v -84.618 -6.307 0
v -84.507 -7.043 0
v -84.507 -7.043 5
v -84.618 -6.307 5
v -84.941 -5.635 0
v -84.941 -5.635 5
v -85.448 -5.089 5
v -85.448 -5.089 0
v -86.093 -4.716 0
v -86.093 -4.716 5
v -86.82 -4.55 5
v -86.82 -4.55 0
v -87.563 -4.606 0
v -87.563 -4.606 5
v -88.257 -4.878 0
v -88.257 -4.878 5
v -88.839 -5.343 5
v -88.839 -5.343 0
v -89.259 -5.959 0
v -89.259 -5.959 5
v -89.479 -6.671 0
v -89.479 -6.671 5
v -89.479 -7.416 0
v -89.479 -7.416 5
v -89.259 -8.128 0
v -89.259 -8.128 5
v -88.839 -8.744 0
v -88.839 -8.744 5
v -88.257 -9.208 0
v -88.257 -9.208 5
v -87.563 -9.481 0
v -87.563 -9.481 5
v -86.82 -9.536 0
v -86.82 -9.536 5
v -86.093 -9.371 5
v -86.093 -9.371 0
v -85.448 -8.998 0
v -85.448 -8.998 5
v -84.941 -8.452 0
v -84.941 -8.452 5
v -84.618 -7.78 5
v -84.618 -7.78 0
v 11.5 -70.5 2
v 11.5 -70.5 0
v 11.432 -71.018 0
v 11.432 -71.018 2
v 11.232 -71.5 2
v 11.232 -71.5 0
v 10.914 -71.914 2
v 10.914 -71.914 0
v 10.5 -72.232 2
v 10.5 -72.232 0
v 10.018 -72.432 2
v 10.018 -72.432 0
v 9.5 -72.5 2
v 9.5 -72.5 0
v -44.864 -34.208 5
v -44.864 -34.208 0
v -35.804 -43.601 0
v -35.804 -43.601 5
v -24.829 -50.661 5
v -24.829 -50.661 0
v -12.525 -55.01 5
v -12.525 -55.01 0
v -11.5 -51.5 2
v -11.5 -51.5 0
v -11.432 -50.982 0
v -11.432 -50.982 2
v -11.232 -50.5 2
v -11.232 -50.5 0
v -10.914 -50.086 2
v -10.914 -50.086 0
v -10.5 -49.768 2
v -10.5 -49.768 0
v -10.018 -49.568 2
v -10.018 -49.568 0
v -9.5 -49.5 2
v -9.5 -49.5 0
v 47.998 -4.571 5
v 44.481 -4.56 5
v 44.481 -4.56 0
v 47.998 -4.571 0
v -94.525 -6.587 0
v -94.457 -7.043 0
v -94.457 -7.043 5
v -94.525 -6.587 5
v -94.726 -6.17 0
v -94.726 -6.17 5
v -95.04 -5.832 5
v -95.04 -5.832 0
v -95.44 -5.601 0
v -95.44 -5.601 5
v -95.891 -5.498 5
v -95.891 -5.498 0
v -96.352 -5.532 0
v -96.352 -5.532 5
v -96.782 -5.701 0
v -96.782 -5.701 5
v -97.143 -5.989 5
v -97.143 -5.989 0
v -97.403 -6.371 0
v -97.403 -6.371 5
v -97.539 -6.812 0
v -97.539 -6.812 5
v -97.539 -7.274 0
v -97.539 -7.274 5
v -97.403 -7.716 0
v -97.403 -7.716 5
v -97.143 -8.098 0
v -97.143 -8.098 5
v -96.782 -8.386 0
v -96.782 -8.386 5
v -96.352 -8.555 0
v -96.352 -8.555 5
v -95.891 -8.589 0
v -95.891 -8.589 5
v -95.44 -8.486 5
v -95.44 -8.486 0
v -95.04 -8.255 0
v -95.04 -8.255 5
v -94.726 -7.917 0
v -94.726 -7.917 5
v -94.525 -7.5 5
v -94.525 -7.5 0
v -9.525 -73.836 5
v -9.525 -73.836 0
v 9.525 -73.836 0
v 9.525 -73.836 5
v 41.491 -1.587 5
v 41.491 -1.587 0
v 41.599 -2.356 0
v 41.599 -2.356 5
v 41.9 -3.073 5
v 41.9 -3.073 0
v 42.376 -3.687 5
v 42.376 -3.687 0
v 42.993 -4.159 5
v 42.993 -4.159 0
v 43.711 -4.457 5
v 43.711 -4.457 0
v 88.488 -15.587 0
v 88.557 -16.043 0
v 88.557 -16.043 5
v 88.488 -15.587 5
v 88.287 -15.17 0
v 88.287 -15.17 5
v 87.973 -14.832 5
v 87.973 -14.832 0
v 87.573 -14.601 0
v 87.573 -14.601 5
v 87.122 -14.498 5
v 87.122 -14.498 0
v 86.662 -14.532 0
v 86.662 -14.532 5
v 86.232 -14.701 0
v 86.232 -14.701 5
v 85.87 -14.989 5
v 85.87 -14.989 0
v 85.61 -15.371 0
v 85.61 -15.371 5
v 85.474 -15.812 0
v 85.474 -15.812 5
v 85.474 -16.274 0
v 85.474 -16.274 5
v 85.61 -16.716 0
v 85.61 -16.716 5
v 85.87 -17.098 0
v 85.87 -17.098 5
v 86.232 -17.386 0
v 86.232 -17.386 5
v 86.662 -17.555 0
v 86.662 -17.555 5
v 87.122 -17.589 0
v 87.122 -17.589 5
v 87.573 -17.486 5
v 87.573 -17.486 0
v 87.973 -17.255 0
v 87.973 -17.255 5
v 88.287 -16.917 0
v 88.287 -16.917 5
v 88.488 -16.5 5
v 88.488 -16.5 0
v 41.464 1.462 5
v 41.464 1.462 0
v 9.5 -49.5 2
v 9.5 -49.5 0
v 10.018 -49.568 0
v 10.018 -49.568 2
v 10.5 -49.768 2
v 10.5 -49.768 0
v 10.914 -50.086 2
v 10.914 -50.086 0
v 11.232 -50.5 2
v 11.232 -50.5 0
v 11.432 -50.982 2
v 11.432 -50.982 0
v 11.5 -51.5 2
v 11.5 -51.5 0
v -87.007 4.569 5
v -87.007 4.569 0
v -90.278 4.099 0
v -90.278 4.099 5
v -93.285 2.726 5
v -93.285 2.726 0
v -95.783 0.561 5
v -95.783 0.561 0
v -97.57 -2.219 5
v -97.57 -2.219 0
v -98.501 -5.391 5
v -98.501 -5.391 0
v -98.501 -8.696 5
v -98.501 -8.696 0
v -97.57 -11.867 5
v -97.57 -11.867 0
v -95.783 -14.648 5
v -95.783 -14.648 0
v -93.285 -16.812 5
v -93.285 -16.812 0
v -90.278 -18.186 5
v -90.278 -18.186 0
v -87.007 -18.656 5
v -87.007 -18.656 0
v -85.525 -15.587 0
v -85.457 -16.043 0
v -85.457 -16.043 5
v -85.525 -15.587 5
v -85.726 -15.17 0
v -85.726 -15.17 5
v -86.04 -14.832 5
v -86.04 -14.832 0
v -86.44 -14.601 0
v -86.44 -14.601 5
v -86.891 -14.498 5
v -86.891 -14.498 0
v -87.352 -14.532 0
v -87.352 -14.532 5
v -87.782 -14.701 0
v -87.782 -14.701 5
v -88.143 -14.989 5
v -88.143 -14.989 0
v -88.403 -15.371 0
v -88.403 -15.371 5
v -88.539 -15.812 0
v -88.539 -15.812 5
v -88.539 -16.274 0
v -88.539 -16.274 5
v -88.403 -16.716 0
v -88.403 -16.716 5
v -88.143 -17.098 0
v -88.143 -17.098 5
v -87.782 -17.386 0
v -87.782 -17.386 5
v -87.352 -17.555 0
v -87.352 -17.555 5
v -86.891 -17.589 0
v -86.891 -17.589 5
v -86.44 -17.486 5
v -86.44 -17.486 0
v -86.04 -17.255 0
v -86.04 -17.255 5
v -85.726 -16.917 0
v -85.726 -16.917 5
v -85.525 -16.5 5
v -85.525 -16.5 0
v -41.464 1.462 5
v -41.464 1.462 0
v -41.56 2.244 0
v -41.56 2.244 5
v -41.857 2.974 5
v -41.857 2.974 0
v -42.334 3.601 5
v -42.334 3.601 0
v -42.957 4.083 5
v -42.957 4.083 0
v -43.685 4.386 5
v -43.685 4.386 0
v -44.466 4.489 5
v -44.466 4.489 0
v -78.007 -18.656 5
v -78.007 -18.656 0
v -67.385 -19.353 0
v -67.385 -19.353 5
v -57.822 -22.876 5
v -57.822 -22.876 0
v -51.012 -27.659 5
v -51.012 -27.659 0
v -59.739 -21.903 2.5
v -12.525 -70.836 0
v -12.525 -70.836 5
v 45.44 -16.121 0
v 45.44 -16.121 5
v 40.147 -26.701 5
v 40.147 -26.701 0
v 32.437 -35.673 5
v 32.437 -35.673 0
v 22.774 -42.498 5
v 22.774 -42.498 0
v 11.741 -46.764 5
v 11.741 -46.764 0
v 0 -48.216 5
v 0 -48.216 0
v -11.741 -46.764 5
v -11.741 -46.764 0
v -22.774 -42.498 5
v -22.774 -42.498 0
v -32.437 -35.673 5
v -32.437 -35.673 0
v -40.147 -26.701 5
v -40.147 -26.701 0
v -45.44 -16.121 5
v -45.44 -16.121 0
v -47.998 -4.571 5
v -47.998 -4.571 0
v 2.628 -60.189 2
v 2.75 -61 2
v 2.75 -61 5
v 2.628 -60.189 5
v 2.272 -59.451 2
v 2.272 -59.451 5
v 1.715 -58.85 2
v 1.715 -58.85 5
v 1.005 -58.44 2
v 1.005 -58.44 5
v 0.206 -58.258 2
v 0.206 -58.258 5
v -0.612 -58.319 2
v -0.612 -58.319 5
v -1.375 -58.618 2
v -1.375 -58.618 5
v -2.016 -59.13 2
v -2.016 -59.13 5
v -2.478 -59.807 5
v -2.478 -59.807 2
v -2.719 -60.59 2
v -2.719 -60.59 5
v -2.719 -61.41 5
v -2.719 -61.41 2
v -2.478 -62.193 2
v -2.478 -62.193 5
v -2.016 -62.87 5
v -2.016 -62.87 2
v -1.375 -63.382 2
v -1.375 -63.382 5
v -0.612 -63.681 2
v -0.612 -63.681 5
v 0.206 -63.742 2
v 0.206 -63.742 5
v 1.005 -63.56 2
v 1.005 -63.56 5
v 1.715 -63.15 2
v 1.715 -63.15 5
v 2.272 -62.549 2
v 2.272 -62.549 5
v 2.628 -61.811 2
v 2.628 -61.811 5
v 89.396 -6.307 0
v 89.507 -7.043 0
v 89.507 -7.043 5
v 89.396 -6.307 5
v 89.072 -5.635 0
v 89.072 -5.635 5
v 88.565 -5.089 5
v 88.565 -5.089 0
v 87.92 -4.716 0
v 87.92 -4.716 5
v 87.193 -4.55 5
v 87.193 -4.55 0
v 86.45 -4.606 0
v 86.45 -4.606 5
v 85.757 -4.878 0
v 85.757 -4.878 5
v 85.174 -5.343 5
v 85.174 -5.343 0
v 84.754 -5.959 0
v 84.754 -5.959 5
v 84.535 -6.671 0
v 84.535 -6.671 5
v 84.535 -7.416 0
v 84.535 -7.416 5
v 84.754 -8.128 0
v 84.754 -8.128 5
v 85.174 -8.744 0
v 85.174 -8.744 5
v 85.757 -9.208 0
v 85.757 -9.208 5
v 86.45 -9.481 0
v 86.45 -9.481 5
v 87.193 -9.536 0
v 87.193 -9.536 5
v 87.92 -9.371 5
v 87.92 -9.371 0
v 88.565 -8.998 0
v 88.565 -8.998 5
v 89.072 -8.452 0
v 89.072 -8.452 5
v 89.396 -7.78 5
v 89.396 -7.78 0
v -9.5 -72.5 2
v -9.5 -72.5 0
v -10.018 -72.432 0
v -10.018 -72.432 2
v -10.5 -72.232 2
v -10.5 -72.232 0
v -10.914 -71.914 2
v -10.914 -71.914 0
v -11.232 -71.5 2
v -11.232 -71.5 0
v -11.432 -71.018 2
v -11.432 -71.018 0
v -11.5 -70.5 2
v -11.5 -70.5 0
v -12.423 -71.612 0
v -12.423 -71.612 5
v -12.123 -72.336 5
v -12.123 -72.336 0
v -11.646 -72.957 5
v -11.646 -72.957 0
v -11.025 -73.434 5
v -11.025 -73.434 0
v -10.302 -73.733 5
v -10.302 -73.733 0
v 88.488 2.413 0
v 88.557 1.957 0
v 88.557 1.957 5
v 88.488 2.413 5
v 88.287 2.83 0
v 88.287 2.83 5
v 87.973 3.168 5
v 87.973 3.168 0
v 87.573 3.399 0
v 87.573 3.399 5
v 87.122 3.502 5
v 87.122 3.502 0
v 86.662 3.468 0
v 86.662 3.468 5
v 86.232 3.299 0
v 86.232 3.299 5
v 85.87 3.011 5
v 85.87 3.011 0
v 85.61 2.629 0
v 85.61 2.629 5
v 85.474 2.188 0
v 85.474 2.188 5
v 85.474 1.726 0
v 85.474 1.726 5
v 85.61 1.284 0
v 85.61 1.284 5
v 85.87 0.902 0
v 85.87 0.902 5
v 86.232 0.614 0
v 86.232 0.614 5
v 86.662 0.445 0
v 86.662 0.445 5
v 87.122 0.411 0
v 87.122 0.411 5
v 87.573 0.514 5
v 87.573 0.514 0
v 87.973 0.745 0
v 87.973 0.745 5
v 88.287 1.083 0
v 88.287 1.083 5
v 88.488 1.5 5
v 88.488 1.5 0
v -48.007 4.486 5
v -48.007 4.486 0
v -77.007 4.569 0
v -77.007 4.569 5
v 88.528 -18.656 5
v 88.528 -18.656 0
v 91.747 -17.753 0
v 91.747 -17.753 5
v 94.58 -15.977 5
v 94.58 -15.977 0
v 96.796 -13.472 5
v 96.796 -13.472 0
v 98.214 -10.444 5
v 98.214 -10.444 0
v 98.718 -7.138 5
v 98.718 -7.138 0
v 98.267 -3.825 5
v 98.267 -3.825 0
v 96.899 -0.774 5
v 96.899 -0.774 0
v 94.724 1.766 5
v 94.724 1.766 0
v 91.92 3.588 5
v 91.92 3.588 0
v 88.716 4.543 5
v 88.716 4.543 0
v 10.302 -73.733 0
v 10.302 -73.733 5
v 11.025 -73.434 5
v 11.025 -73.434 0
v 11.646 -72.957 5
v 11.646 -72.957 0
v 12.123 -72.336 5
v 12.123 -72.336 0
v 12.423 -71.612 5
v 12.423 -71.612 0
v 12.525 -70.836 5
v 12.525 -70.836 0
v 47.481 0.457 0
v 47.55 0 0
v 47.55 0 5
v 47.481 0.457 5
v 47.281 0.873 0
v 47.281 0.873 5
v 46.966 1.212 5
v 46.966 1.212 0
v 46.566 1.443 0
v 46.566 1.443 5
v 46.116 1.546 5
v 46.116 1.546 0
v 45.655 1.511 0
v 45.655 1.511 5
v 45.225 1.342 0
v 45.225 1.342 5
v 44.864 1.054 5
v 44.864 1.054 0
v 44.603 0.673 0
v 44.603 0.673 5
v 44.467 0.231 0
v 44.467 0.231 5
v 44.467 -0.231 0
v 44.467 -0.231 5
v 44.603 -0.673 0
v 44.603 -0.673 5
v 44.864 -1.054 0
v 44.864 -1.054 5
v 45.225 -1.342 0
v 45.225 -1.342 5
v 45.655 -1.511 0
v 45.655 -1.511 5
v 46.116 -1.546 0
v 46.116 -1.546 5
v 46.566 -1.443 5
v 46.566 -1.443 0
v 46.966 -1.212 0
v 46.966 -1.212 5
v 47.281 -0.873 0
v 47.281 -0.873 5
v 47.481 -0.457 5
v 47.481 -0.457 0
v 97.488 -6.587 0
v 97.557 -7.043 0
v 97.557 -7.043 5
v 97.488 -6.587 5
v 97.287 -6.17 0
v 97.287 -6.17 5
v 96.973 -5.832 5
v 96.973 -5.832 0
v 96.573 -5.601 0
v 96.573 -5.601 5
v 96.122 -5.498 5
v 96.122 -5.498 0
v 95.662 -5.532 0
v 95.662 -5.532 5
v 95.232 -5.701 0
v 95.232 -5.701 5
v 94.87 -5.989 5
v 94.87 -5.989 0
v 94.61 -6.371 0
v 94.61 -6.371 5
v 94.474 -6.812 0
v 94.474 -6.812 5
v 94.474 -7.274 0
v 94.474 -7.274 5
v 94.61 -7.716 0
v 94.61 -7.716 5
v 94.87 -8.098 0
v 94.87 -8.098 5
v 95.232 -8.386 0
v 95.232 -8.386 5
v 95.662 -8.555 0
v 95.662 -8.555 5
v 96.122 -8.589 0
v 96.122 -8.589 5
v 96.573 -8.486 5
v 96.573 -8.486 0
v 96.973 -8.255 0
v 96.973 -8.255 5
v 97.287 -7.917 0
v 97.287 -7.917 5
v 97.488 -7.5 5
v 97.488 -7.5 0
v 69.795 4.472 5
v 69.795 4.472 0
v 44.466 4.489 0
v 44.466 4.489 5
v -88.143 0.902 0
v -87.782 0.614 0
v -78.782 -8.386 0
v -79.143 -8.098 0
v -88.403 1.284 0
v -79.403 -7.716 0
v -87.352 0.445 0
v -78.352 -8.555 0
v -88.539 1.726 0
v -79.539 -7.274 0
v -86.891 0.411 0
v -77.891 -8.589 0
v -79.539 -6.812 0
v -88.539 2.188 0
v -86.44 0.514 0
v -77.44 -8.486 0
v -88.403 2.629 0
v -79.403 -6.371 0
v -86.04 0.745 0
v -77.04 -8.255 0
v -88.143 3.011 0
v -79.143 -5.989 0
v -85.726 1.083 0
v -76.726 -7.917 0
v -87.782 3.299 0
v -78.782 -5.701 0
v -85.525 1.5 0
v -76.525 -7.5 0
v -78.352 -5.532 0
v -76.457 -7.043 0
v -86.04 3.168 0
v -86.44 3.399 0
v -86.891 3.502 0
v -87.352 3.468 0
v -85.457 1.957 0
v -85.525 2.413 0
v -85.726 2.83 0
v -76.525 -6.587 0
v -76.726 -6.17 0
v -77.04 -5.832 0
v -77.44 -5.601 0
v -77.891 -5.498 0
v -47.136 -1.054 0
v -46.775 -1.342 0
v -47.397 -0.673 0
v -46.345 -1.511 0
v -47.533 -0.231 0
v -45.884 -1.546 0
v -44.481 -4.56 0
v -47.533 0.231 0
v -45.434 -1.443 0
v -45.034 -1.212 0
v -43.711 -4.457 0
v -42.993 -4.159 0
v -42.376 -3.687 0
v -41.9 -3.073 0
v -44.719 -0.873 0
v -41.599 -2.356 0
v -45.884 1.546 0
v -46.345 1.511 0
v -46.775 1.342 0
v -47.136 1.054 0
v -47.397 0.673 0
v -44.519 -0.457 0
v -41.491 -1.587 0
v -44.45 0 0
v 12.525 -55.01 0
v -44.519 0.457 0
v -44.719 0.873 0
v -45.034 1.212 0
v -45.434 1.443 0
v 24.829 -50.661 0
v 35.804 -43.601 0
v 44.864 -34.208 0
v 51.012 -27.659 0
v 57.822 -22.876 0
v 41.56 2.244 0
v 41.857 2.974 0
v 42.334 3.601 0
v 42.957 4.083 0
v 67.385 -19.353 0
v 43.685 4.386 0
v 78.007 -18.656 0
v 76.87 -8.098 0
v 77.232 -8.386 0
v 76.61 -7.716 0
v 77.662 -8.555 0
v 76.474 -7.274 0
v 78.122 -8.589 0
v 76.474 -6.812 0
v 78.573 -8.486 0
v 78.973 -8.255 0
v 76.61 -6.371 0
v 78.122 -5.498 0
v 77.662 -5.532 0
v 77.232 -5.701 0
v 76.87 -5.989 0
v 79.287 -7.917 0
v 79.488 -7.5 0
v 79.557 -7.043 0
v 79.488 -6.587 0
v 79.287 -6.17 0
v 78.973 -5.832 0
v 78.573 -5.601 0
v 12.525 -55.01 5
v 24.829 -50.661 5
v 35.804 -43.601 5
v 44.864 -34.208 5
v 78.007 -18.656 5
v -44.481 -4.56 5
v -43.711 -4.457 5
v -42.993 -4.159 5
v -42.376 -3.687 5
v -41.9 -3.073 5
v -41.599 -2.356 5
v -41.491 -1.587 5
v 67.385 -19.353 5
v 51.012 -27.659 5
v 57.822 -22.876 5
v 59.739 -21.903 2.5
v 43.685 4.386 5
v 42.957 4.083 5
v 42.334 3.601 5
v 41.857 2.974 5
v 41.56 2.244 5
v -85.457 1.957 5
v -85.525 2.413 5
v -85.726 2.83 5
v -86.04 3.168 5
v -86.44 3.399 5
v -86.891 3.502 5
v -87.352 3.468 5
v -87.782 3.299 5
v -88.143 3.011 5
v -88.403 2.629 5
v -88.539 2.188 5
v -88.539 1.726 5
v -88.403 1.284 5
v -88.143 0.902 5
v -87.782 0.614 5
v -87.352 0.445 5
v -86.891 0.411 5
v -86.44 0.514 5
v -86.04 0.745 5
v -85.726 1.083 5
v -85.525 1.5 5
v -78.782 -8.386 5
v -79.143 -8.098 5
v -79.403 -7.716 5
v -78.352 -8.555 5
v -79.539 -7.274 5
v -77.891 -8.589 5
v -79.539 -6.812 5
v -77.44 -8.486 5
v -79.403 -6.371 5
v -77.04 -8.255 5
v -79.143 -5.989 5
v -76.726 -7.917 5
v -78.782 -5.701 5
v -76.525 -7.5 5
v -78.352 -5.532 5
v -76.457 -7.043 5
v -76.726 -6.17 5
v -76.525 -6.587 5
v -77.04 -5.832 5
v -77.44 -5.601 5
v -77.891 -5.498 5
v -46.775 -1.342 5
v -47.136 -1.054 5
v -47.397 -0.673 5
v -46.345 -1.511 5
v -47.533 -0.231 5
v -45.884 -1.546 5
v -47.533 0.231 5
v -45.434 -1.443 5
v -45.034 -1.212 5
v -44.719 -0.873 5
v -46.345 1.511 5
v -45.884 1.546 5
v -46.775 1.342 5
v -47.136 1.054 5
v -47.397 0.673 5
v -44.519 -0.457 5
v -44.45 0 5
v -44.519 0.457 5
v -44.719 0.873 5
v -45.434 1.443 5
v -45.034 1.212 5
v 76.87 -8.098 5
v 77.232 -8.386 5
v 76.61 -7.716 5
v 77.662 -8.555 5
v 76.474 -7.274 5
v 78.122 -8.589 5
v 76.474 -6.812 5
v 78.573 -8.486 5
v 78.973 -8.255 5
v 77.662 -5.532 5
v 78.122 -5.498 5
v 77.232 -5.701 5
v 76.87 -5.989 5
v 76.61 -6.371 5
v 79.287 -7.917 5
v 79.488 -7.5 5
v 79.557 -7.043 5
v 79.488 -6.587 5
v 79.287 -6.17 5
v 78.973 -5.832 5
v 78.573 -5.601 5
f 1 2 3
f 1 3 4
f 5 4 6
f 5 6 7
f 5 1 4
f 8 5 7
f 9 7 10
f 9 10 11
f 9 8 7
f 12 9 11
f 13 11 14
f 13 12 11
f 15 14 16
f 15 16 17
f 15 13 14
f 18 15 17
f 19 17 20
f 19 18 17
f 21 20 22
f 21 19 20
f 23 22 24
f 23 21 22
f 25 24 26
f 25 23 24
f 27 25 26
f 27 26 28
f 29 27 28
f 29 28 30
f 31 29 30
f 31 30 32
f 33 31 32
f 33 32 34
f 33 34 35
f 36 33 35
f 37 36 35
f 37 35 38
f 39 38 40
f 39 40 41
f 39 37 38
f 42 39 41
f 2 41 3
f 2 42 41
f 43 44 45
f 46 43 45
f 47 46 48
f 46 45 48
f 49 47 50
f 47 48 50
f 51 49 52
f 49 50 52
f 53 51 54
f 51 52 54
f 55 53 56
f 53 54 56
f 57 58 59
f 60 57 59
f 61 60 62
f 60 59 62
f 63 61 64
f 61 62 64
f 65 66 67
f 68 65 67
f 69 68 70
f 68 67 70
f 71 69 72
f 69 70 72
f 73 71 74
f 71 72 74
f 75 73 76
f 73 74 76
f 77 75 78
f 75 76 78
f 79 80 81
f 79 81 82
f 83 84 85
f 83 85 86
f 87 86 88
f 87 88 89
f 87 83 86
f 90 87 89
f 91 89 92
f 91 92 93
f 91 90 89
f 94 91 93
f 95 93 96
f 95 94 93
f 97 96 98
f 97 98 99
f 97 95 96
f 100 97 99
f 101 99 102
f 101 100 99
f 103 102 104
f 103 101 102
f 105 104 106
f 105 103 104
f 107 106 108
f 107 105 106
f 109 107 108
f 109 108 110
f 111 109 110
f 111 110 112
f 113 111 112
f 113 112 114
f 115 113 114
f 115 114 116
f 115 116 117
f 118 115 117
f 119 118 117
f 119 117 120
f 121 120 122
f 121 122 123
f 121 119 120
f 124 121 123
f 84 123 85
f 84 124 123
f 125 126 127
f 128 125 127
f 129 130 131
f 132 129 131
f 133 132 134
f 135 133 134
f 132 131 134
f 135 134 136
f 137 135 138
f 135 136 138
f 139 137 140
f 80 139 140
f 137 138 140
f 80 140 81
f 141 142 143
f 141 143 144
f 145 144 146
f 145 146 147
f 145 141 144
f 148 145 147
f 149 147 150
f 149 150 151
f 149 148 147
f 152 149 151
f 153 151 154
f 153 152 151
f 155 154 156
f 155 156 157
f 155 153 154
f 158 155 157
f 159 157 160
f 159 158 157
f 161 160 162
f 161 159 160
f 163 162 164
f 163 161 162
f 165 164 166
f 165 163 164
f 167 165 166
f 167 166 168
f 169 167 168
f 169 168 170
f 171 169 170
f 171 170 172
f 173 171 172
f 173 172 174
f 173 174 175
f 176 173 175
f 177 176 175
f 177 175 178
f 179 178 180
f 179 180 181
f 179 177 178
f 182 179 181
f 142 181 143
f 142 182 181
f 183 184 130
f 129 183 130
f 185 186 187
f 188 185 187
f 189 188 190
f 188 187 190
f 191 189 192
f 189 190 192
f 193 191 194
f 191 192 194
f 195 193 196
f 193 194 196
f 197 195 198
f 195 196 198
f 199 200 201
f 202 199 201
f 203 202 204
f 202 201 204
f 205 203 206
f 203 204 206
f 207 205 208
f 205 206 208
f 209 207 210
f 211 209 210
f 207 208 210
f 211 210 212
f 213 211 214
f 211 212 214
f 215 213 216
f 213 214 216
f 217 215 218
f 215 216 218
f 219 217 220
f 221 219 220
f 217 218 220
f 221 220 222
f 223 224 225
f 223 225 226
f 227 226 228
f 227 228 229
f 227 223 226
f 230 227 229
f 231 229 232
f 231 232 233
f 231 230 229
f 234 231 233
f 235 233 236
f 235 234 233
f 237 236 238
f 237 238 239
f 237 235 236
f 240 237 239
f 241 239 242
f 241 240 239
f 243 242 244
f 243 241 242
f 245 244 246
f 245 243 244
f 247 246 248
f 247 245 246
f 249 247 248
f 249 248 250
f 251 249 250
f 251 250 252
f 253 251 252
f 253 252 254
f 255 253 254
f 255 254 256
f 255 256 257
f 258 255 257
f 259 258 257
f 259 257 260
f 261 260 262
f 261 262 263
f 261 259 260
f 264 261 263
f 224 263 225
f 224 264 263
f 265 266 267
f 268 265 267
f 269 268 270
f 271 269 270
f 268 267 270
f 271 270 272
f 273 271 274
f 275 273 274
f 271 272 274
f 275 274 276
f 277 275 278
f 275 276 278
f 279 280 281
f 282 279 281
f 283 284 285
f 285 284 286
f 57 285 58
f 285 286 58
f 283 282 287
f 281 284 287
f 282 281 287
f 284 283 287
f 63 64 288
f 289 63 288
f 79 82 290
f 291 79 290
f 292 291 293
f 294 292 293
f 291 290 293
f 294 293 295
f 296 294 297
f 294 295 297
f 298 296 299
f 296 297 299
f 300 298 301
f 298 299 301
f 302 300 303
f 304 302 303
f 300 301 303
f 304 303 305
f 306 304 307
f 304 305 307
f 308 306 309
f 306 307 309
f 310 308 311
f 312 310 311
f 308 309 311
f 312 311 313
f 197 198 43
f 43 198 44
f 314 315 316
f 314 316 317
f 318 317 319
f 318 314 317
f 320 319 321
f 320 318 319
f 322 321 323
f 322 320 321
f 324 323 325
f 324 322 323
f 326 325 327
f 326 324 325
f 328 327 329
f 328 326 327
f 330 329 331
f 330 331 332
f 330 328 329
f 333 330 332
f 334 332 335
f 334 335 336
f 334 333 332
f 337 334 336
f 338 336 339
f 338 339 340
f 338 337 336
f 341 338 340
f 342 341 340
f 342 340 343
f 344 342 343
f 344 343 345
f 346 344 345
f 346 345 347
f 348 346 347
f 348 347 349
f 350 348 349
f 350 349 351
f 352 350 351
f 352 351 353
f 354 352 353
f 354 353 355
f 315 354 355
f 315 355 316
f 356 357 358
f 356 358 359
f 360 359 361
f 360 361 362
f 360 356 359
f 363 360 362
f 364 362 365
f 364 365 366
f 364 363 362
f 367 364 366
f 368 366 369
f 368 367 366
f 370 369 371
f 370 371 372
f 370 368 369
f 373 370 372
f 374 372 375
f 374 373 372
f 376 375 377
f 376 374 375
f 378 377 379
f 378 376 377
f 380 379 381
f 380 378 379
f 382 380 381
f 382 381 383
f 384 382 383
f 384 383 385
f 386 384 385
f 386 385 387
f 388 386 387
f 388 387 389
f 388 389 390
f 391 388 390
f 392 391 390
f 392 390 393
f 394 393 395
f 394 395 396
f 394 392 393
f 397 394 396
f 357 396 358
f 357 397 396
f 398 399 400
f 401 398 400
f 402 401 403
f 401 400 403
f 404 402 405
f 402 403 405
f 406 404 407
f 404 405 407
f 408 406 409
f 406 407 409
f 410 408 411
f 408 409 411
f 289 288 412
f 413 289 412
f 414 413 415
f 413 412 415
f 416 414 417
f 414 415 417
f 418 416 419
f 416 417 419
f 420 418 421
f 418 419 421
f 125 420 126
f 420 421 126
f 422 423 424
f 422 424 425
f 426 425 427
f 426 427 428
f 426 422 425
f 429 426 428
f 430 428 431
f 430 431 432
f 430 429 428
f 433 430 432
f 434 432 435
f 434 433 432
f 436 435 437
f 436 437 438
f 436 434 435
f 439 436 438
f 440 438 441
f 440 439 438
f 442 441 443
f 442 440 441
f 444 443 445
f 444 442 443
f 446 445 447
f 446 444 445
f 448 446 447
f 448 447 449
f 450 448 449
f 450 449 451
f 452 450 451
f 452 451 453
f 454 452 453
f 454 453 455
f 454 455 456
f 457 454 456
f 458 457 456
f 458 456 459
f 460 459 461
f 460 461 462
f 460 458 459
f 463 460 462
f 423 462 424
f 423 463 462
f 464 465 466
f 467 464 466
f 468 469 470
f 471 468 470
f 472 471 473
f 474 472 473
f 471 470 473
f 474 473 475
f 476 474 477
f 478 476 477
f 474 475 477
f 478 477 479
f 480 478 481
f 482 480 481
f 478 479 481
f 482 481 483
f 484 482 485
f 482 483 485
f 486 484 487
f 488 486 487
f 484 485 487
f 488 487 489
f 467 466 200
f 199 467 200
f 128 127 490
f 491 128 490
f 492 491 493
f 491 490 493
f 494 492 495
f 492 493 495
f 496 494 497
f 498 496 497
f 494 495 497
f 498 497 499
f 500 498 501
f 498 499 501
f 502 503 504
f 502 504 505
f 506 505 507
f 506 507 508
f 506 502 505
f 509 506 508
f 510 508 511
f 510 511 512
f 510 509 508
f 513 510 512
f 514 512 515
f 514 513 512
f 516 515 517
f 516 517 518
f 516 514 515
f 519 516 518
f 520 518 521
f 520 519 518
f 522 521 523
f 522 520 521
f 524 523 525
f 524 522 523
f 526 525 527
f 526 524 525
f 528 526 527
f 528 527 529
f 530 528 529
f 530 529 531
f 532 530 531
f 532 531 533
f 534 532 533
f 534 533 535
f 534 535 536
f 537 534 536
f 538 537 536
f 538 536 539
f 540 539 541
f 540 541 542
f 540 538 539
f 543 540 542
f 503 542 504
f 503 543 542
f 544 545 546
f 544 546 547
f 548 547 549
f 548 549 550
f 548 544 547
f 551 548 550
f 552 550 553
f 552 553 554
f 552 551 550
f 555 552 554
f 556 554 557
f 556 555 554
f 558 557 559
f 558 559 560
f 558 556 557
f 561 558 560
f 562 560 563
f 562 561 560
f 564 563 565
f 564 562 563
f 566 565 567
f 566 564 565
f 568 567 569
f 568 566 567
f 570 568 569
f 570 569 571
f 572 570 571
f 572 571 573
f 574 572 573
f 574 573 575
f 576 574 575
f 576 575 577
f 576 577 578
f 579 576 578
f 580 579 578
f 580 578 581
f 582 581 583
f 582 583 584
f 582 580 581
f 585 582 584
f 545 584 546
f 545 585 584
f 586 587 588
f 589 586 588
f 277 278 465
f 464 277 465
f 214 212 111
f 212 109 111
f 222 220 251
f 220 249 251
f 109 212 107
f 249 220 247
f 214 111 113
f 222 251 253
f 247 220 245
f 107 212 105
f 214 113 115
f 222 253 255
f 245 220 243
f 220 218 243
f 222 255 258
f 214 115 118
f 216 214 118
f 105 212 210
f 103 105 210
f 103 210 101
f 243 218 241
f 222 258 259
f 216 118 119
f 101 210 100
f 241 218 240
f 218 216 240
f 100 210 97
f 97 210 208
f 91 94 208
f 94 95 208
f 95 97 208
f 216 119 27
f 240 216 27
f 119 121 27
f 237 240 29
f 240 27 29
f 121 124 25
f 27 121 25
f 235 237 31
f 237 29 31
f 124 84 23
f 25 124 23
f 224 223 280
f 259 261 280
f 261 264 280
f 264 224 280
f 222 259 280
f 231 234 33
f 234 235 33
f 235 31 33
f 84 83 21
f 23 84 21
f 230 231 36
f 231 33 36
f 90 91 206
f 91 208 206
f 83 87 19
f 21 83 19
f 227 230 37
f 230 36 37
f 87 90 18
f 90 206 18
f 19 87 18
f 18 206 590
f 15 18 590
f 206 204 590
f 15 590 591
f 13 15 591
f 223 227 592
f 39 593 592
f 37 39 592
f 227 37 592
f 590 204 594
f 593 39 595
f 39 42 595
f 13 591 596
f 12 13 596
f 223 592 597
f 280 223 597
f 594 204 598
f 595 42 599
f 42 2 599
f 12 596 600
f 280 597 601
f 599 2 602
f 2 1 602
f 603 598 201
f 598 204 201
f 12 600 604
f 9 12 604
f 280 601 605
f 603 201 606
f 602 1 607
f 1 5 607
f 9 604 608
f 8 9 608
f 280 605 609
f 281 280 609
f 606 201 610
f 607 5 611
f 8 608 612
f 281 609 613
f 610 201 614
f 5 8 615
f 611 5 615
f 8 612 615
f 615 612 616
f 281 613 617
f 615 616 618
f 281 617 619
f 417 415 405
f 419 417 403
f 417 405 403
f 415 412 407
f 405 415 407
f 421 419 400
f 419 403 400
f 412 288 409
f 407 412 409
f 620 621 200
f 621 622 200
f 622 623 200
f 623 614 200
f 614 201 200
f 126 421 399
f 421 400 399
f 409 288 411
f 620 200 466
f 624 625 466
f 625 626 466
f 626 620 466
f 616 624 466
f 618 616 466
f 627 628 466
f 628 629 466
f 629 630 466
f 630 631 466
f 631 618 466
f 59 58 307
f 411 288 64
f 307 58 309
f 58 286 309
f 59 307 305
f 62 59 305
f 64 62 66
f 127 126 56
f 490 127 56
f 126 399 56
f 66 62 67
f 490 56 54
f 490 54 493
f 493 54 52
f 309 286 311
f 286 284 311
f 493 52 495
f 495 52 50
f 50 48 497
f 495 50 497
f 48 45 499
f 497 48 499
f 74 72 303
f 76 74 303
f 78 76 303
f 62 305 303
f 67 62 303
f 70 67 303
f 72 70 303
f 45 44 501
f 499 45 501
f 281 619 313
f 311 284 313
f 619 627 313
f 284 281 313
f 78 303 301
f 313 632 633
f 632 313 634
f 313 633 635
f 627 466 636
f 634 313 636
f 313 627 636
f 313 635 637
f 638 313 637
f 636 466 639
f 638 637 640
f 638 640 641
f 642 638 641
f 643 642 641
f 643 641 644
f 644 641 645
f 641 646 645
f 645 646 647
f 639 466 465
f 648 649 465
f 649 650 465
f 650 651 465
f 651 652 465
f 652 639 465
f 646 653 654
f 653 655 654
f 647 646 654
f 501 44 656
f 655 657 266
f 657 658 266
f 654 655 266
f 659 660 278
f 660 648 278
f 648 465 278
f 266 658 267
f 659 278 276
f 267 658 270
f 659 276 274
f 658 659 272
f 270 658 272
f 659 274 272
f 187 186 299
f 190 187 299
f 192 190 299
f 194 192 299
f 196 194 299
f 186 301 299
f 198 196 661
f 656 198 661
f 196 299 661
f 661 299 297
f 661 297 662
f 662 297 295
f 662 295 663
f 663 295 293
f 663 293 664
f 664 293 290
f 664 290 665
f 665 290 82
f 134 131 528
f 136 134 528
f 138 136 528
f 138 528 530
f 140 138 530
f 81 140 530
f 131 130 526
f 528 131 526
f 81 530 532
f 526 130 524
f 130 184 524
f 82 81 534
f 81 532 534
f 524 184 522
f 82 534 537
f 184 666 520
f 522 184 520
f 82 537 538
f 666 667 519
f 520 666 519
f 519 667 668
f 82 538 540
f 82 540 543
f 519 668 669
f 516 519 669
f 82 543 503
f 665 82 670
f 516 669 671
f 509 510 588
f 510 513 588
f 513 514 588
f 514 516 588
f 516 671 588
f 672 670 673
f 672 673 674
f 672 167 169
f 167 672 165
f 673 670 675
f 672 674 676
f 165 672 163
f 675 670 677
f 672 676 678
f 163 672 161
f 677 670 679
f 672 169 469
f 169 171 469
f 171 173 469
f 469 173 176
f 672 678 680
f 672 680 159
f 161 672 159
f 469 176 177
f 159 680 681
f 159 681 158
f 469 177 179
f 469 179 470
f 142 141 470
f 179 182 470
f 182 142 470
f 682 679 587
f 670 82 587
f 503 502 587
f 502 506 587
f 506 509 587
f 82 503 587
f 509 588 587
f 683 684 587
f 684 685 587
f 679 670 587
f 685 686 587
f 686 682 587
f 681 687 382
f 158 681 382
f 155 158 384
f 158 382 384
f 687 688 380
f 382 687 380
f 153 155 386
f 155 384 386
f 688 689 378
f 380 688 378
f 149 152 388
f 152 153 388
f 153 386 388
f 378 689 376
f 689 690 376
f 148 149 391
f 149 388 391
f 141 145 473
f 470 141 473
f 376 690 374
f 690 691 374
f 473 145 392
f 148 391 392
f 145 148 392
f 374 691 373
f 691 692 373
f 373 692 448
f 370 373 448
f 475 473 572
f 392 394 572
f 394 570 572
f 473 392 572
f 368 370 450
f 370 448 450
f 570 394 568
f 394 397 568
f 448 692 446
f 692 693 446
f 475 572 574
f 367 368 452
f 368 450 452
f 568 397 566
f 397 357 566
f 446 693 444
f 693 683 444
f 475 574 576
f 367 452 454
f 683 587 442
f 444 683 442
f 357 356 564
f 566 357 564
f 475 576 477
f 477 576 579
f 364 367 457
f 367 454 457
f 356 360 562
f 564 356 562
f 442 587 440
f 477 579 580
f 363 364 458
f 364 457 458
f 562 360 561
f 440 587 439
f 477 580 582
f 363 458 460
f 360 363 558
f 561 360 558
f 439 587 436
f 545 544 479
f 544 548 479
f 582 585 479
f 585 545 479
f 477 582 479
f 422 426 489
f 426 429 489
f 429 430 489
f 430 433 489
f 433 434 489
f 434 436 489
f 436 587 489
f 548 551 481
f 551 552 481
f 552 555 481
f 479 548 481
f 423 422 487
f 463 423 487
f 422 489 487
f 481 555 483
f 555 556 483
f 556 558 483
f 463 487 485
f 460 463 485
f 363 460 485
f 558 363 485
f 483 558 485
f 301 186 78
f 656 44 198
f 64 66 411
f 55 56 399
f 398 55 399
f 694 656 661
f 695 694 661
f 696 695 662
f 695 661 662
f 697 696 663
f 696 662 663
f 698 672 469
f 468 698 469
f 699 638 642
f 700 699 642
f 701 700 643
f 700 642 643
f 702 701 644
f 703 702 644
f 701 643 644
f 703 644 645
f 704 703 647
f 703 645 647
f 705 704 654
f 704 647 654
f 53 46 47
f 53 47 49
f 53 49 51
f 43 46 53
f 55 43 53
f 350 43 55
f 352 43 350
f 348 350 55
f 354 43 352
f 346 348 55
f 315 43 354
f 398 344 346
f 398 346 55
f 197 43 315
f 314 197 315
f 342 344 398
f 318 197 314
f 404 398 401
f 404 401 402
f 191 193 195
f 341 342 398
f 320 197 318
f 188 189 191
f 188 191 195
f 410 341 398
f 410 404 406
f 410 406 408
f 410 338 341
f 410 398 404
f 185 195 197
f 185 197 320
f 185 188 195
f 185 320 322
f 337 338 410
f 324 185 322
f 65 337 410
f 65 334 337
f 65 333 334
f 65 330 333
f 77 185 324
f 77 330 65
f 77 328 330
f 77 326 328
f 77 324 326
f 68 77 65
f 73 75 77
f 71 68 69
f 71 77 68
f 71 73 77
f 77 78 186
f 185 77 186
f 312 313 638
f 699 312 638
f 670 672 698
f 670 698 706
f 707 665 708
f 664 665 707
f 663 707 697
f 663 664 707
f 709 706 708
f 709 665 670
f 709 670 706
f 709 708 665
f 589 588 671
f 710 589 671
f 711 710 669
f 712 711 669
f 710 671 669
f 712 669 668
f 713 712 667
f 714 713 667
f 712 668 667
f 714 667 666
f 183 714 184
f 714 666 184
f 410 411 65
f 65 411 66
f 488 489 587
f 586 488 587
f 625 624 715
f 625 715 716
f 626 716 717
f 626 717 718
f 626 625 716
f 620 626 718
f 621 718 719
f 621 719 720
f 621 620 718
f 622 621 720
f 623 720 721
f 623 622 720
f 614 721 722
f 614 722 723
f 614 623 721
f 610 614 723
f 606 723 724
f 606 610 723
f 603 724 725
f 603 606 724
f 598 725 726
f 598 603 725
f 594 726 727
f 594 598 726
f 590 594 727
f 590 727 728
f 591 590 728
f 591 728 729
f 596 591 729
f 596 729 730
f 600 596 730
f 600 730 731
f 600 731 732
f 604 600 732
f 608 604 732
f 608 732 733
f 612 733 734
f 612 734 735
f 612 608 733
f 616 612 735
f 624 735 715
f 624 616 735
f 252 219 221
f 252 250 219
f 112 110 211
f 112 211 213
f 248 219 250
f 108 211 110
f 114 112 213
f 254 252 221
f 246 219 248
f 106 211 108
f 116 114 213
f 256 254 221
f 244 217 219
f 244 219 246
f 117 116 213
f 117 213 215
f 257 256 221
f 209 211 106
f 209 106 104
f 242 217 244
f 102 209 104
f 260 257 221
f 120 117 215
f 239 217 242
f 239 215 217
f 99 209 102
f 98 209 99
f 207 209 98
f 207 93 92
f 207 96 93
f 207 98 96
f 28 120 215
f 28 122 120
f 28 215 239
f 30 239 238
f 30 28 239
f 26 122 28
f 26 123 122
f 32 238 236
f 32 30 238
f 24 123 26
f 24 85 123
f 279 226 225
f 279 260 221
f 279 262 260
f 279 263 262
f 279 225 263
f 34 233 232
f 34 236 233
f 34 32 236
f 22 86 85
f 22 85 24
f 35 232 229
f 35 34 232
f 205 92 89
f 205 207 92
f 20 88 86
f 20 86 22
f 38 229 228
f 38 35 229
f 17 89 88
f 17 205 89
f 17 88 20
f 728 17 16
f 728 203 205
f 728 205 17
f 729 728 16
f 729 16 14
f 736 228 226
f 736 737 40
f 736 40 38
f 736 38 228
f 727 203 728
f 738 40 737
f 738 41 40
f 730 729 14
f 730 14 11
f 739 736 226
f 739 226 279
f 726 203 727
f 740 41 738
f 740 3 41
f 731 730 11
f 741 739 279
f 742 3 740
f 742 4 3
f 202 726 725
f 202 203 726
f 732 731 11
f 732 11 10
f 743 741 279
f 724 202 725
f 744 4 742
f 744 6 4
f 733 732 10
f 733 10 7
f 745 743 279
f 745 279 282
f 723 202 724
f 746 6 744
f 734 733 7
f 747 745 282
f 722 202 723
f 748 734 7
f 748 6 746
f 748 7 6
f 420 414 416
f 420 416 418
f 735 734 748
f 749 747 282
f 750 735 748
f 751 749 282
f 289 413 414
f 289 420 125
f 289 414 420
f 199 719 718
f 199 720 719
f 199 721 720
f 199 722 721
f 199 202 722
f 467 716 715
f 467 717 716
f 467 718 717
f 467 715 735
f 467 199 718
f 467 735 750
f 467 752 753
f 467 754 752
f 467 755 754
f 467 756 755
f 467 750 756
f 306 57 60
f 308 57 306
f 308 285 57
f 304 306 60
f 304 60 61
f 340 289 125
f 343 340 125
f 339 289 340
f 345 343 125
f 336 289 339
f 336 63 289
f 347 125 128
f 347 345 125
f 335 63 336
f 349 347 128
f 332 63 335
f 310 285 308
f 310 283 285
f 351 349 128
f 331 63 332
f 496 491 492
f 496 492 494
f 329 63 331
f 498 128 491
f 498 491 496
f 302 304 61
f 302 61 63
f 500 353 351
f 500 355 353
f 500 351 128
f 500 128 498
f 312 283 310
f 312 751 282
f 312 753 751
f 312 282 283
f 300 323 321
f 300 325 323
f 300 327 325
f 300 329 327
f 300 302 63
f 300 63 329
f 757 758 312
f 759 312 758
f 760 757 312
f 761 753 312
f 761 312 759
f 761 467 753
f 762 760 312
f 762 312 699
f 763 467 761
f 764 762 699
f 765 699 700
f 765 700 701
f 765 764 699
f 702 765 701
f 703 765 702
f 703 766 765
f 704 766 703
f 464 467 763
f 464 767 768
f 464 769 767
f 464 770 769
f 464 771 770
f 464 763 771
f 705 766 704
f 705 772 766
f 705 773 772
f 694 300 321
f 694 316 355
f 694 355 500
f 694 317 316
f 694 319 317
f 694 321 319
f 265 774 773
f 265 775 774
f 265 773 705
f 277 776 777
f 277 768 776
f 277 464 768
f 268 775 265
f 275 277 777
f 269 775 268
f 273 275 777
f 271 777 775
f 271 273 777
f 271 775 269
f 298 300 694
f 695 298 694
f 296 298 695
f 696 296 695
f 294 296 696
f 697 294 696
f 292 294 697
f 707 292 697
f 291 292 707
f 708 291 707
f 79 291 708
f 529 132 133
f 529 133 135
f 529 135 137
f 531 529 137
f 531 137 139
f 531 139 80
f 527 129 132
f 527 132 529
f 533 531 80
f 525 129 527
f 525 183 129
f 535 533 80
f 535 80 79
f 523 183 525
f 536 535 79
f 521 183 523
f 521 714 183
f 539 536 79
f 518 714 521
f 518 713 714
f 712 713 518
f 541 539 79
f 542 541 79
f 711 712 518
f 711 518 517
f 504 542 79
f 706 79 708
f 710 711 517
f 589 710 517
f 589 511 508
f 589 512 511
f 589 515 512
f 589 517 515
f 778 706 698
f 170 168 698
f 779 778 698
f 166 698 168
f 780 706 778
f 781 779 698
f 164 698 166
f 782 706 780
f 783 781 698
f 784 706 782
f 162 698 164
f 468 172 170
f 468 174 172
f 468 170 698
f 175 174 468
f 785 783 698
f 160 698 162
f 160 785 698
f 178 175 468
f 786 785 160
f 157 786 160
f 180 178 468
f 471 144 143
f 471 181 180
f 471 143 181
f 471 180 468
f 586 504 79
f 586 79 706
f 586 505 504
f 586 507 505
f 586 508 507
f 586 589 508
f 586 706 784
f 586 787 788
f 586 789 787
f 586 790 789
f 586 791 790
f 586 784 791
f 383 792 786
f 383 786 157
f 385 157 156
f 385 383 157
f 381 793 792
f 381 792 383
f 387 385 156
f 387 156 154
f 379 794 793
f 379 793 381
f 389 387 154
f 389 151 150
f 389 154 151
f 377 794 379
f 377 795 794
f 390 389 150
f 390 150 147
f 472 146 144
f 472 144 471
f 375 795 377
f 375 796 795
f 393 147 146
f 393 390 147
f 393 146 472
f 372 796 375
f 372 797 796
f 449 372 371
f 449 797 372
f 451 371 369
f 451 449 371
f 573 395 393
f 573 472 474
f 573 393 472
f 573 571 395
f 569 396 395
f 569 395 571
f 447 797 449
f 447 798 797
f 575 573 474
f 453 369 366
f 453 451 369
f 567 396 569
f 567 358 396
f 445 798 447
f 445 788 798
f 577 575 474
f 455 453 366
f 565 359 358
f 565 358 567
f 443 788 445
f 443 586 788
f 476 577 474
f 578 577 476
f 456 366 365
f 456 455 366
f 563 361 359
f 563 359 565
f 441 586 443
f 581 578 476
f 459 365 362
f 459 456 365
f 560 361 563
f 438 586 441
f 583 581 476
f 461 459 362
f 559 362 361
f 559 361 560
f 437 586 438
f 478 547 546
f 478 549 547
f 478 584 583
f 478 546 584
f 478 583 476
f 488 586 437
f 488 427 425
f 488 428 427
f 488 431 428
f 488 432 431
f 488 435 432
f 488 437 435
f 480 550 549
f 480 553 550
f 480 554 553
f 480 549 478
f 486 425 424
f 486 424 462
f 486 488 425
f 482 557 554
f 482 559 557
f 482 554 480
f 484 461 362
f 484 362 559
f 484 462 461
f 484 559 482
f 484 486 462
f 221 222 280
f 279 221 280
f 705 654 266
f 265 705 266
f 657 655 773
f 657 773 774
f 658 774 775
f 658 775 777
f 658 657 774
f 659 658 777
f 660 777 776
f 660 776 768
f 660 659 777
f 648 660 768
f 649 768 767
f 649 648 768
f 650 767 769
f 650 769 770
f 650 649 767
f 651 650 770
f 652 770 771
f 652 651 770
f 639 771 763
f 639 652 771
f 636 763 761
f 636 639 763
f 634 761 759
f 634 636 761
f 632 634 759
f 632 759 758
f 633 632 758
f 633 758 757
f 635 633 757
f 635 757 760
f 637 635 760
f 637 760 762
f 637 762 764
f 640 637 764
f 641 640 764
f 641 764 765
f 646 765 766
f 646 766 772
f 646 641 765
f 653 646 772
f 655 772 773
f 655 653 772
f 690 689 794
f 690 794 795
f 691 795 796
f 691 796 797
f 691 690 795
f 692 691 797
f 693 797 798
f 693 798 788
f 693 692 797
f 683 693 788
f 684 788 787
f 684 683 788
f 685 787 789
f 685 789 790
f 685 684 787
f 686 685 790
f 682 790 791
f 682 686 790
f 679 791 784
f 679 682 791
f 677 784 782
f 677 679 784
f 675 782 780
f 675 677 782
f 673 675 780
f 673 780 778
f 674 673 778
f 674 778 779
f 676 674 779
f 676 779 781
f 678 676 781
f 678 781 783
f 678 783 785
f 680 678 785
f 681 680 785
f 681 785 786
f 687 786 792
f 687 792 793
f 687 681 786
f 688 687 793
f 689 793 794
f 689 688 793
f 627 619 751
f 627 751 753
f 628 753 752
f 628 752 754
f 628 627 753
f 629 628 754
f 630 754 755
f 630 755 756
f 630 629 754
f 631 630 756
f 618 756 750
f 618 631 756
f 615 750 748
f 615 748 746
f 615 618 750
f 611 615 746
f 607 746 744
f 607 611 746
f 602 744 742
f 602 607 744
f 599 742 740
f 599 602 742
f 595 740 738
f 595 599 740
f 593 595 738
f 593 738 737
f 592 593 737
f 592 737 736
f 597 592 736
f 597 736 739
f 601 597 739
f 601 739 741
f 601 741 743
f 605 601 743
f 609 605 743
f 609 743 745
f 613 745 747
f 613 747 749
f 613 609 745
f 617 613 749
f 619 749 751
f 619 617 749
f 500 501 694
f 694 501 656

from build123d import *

# Parameters (mm, degrees)
SKETCH2_R           = 1.55
SKETCH2_R_2         = 2.499999997
SKETCH2_R_3         = 2.75
BOSS_EXTRUDE1_DEPTH = 5
CUT_EXTRUDE1_DEPTH  = 2


with BuildPart() as part:
    # Sketch2 → Boss-Extrude1 (new body)
    with BuildSketch(Plane.XY):
        with BuildLine():
            ThreePointArc((-12.525089607, -70.83564173), (-11.646409951, -72.956962073), (-9.525089607, -73.83564173))
            Line((-9.525089607, -73.83564173), (9.525089607, -73.83564173))
            ThreePointArc((9.525089607, -73.83564173), (11.646409951, -72.956962073), (12.525089607, -70.83564173))
            Line((12.525089607, -70.83564173), (12.525089607, -55.009940427))
            ThreePointArc((12.525089607, -55.009940427), (30.521330754, -47.449128385), (44.86389153, -34.208224921))
            add(Edge.make_bspline(
                [(78.006603773, -18.655919566), (58.043406574, -17.372955625), (44.86389153, -34.208224921)],
                knots=[0, 0, 0, 1, 1, 1], degree=2))
            Line((78.006603773, -18.655919566), (88.527931482, -18.655919566))
            ThreePointArc((88.527931482, -18.655919566), (98.717948133, -7.13841292), (88.716103535, 4.542875677))
            Line((88.716103535, 4.542875677), (69.795285346, 4.472063654))
            Line((69.795285346, 4.472063654), (44.465833223, 4.48880334))
            ThreePointArc((44.465833223, 4.48880334), (42.333815881, 3.601374029), (41.463969238, 1.462122864))
            Line((41.463969238, 1.462122864), (41.491086519, -1.586796959))
            ThreePointArc((41.491086519, -1.586796959), (42.375663318, -3.687434951), (44.481277596, -4.560100178))
            Line((44.481277596, -4.560100178), (47.998316287, -4.571460593))
            ThreePointArc((47.998316287, -4.571460593), (0, -48.215522587), (-47.998316287, -4.571460593))
            Line((-47.998316287, -4.571460593), (-44.481277596, -4.560100178))
            ThreePointArc((-44.481277596, -4.560100178), (-42.375663318, -3.687434951), (-41.491086519, -1.586796959))
            Line((-41.491086519, -1.586796959), (-41.463969238, 1.462122864))
            ThreePointArc((-41.463969238, 1.462122864), (-42.333815881, 3.601374029), (-44.465833223, 4.48880334))
            Line((-44.465833223, 4.48880334), (-48.006603773, 4.486463321))
            Line((-48.006603773, 4.486463321), (-77.006603773, 4.569081841))
            Line((-77.006603773, 4.569081841), (-87.006603773, 4.569081841))
            ThreePointArc((-87.006603773, 4.569081841), (-98.619104477, -7.043418862), (-87.006603773, -18.655919566))
            Line((-87.006603773, -18.655919566), (-78.006603773, -18.655919566))
            add(Edge.make_bspline(
                [(-78.006603773, -18.655919566), (-58.043406574, -17.372955625), (-44.86389153, -34.208224921)],
                knots=[0, 0, 0, 1, 1, 1], degree=2))
            ThreePointArc((-44.86389153, -34.208224921), (-30.521330754, -47.449128385), (-12.525089607, -55.009940427))
            Line((-12.525089607, -55.009940427), (-12.525089607, -70.83564173))
        make_face()
        with Locations((-87.006603773, -16.043418862)):
            Circle(SKETCH2_R, mode=Mode.SUBTRACT)
        with Locations((-96.006603773, -7.043418862)):
            Circle(SKETCH2_R, mode=Mode.SUBTRACT)
        with Locations((-87.006603773, -7.043418862)):
            Circle(SKETCH2_R_2, mode=Mode.SUBTRACT)
        with Locations((-78.006603773, -7.043418862)):
            Circle(SKETCH2_R, mode=Mode.SUBTRACT)
        with Locations((-87.006603773, 1.956581138)):
            Circle(SKETCH2_R, mode=Mode.SUBTRACT)
        with Locations((-46, 0)):
            Circle(SKETCH2_R, mode=Mode.SUBTRACT)
        with Locations((87.006603773, -16.043418862)):
            Circle(SKETCH2_R, mode=Mode.SUBTRACT)
        with Locations((46, 0)):
            Circle(SKETCH2_R, mode=Mode.SUBTRACT)
        with Locations((78.006603773, -7.043418862)):
            Circle(SKETCH2_R, mode=Mode.SUBTRACT)
        with Locations((87.006603773, -7.043418862)):
            Circle(SKETCH2_R_2, mode=Mode.SUBTRACT)
        with Locations((96.006603773, -7.043418862)):
            Circle(SKETCH2_R, mode=Mode.SUBTRACT)
        with Locations((87.006603773, 1.956581138)):
            Circle(SKETCH2_R, mode=Mode.SUBTRACT)
        with Locations((0, -61)):
            Circle(SKETCH2_R_3, mode=Mode.SUBTRACT)
    extrude(amount=BOSS_EXTRUDE1_DEPTH)

    # Sketch3 → Cut-Extrude1 (cut)
    with BuildSketch(Plane(origin=(0, 0, 0), x_dir=(-1, 0, 0), z_dir=(0, 0, -1))):
        with BuildLine():
            Line((9.5, -49.5), (-9.5, -49.5))
            ThreePointArc((-9.5, -49.5), (-10.914213562, -50.085786438), (-11.5, -51.5))
            Line((-11.5, -51.5), (-11.5, -70.5))
            ThreePointArc((-11.5, -70.5), (-10.914213562, -71.914213562), (-9.5, -72.5))
            Line((-9.5, -72.5), (9.5, -72.5))
            ThreePointArc((9.5, -72.5), (10.914213562, -71.914213562), (11.5, -70.5))
            Line((11.5, -70.5), (11.5, -51.5))
            ThreePointArc((11.5, -51.5), (10.914213562, -50.085786438), (9.5, -49.5))
        make_face()
    extrude(amount=-CUT_EXTRUDE1_DEPTH, mode=Mode.SUBTRACT)


solid = part.part
